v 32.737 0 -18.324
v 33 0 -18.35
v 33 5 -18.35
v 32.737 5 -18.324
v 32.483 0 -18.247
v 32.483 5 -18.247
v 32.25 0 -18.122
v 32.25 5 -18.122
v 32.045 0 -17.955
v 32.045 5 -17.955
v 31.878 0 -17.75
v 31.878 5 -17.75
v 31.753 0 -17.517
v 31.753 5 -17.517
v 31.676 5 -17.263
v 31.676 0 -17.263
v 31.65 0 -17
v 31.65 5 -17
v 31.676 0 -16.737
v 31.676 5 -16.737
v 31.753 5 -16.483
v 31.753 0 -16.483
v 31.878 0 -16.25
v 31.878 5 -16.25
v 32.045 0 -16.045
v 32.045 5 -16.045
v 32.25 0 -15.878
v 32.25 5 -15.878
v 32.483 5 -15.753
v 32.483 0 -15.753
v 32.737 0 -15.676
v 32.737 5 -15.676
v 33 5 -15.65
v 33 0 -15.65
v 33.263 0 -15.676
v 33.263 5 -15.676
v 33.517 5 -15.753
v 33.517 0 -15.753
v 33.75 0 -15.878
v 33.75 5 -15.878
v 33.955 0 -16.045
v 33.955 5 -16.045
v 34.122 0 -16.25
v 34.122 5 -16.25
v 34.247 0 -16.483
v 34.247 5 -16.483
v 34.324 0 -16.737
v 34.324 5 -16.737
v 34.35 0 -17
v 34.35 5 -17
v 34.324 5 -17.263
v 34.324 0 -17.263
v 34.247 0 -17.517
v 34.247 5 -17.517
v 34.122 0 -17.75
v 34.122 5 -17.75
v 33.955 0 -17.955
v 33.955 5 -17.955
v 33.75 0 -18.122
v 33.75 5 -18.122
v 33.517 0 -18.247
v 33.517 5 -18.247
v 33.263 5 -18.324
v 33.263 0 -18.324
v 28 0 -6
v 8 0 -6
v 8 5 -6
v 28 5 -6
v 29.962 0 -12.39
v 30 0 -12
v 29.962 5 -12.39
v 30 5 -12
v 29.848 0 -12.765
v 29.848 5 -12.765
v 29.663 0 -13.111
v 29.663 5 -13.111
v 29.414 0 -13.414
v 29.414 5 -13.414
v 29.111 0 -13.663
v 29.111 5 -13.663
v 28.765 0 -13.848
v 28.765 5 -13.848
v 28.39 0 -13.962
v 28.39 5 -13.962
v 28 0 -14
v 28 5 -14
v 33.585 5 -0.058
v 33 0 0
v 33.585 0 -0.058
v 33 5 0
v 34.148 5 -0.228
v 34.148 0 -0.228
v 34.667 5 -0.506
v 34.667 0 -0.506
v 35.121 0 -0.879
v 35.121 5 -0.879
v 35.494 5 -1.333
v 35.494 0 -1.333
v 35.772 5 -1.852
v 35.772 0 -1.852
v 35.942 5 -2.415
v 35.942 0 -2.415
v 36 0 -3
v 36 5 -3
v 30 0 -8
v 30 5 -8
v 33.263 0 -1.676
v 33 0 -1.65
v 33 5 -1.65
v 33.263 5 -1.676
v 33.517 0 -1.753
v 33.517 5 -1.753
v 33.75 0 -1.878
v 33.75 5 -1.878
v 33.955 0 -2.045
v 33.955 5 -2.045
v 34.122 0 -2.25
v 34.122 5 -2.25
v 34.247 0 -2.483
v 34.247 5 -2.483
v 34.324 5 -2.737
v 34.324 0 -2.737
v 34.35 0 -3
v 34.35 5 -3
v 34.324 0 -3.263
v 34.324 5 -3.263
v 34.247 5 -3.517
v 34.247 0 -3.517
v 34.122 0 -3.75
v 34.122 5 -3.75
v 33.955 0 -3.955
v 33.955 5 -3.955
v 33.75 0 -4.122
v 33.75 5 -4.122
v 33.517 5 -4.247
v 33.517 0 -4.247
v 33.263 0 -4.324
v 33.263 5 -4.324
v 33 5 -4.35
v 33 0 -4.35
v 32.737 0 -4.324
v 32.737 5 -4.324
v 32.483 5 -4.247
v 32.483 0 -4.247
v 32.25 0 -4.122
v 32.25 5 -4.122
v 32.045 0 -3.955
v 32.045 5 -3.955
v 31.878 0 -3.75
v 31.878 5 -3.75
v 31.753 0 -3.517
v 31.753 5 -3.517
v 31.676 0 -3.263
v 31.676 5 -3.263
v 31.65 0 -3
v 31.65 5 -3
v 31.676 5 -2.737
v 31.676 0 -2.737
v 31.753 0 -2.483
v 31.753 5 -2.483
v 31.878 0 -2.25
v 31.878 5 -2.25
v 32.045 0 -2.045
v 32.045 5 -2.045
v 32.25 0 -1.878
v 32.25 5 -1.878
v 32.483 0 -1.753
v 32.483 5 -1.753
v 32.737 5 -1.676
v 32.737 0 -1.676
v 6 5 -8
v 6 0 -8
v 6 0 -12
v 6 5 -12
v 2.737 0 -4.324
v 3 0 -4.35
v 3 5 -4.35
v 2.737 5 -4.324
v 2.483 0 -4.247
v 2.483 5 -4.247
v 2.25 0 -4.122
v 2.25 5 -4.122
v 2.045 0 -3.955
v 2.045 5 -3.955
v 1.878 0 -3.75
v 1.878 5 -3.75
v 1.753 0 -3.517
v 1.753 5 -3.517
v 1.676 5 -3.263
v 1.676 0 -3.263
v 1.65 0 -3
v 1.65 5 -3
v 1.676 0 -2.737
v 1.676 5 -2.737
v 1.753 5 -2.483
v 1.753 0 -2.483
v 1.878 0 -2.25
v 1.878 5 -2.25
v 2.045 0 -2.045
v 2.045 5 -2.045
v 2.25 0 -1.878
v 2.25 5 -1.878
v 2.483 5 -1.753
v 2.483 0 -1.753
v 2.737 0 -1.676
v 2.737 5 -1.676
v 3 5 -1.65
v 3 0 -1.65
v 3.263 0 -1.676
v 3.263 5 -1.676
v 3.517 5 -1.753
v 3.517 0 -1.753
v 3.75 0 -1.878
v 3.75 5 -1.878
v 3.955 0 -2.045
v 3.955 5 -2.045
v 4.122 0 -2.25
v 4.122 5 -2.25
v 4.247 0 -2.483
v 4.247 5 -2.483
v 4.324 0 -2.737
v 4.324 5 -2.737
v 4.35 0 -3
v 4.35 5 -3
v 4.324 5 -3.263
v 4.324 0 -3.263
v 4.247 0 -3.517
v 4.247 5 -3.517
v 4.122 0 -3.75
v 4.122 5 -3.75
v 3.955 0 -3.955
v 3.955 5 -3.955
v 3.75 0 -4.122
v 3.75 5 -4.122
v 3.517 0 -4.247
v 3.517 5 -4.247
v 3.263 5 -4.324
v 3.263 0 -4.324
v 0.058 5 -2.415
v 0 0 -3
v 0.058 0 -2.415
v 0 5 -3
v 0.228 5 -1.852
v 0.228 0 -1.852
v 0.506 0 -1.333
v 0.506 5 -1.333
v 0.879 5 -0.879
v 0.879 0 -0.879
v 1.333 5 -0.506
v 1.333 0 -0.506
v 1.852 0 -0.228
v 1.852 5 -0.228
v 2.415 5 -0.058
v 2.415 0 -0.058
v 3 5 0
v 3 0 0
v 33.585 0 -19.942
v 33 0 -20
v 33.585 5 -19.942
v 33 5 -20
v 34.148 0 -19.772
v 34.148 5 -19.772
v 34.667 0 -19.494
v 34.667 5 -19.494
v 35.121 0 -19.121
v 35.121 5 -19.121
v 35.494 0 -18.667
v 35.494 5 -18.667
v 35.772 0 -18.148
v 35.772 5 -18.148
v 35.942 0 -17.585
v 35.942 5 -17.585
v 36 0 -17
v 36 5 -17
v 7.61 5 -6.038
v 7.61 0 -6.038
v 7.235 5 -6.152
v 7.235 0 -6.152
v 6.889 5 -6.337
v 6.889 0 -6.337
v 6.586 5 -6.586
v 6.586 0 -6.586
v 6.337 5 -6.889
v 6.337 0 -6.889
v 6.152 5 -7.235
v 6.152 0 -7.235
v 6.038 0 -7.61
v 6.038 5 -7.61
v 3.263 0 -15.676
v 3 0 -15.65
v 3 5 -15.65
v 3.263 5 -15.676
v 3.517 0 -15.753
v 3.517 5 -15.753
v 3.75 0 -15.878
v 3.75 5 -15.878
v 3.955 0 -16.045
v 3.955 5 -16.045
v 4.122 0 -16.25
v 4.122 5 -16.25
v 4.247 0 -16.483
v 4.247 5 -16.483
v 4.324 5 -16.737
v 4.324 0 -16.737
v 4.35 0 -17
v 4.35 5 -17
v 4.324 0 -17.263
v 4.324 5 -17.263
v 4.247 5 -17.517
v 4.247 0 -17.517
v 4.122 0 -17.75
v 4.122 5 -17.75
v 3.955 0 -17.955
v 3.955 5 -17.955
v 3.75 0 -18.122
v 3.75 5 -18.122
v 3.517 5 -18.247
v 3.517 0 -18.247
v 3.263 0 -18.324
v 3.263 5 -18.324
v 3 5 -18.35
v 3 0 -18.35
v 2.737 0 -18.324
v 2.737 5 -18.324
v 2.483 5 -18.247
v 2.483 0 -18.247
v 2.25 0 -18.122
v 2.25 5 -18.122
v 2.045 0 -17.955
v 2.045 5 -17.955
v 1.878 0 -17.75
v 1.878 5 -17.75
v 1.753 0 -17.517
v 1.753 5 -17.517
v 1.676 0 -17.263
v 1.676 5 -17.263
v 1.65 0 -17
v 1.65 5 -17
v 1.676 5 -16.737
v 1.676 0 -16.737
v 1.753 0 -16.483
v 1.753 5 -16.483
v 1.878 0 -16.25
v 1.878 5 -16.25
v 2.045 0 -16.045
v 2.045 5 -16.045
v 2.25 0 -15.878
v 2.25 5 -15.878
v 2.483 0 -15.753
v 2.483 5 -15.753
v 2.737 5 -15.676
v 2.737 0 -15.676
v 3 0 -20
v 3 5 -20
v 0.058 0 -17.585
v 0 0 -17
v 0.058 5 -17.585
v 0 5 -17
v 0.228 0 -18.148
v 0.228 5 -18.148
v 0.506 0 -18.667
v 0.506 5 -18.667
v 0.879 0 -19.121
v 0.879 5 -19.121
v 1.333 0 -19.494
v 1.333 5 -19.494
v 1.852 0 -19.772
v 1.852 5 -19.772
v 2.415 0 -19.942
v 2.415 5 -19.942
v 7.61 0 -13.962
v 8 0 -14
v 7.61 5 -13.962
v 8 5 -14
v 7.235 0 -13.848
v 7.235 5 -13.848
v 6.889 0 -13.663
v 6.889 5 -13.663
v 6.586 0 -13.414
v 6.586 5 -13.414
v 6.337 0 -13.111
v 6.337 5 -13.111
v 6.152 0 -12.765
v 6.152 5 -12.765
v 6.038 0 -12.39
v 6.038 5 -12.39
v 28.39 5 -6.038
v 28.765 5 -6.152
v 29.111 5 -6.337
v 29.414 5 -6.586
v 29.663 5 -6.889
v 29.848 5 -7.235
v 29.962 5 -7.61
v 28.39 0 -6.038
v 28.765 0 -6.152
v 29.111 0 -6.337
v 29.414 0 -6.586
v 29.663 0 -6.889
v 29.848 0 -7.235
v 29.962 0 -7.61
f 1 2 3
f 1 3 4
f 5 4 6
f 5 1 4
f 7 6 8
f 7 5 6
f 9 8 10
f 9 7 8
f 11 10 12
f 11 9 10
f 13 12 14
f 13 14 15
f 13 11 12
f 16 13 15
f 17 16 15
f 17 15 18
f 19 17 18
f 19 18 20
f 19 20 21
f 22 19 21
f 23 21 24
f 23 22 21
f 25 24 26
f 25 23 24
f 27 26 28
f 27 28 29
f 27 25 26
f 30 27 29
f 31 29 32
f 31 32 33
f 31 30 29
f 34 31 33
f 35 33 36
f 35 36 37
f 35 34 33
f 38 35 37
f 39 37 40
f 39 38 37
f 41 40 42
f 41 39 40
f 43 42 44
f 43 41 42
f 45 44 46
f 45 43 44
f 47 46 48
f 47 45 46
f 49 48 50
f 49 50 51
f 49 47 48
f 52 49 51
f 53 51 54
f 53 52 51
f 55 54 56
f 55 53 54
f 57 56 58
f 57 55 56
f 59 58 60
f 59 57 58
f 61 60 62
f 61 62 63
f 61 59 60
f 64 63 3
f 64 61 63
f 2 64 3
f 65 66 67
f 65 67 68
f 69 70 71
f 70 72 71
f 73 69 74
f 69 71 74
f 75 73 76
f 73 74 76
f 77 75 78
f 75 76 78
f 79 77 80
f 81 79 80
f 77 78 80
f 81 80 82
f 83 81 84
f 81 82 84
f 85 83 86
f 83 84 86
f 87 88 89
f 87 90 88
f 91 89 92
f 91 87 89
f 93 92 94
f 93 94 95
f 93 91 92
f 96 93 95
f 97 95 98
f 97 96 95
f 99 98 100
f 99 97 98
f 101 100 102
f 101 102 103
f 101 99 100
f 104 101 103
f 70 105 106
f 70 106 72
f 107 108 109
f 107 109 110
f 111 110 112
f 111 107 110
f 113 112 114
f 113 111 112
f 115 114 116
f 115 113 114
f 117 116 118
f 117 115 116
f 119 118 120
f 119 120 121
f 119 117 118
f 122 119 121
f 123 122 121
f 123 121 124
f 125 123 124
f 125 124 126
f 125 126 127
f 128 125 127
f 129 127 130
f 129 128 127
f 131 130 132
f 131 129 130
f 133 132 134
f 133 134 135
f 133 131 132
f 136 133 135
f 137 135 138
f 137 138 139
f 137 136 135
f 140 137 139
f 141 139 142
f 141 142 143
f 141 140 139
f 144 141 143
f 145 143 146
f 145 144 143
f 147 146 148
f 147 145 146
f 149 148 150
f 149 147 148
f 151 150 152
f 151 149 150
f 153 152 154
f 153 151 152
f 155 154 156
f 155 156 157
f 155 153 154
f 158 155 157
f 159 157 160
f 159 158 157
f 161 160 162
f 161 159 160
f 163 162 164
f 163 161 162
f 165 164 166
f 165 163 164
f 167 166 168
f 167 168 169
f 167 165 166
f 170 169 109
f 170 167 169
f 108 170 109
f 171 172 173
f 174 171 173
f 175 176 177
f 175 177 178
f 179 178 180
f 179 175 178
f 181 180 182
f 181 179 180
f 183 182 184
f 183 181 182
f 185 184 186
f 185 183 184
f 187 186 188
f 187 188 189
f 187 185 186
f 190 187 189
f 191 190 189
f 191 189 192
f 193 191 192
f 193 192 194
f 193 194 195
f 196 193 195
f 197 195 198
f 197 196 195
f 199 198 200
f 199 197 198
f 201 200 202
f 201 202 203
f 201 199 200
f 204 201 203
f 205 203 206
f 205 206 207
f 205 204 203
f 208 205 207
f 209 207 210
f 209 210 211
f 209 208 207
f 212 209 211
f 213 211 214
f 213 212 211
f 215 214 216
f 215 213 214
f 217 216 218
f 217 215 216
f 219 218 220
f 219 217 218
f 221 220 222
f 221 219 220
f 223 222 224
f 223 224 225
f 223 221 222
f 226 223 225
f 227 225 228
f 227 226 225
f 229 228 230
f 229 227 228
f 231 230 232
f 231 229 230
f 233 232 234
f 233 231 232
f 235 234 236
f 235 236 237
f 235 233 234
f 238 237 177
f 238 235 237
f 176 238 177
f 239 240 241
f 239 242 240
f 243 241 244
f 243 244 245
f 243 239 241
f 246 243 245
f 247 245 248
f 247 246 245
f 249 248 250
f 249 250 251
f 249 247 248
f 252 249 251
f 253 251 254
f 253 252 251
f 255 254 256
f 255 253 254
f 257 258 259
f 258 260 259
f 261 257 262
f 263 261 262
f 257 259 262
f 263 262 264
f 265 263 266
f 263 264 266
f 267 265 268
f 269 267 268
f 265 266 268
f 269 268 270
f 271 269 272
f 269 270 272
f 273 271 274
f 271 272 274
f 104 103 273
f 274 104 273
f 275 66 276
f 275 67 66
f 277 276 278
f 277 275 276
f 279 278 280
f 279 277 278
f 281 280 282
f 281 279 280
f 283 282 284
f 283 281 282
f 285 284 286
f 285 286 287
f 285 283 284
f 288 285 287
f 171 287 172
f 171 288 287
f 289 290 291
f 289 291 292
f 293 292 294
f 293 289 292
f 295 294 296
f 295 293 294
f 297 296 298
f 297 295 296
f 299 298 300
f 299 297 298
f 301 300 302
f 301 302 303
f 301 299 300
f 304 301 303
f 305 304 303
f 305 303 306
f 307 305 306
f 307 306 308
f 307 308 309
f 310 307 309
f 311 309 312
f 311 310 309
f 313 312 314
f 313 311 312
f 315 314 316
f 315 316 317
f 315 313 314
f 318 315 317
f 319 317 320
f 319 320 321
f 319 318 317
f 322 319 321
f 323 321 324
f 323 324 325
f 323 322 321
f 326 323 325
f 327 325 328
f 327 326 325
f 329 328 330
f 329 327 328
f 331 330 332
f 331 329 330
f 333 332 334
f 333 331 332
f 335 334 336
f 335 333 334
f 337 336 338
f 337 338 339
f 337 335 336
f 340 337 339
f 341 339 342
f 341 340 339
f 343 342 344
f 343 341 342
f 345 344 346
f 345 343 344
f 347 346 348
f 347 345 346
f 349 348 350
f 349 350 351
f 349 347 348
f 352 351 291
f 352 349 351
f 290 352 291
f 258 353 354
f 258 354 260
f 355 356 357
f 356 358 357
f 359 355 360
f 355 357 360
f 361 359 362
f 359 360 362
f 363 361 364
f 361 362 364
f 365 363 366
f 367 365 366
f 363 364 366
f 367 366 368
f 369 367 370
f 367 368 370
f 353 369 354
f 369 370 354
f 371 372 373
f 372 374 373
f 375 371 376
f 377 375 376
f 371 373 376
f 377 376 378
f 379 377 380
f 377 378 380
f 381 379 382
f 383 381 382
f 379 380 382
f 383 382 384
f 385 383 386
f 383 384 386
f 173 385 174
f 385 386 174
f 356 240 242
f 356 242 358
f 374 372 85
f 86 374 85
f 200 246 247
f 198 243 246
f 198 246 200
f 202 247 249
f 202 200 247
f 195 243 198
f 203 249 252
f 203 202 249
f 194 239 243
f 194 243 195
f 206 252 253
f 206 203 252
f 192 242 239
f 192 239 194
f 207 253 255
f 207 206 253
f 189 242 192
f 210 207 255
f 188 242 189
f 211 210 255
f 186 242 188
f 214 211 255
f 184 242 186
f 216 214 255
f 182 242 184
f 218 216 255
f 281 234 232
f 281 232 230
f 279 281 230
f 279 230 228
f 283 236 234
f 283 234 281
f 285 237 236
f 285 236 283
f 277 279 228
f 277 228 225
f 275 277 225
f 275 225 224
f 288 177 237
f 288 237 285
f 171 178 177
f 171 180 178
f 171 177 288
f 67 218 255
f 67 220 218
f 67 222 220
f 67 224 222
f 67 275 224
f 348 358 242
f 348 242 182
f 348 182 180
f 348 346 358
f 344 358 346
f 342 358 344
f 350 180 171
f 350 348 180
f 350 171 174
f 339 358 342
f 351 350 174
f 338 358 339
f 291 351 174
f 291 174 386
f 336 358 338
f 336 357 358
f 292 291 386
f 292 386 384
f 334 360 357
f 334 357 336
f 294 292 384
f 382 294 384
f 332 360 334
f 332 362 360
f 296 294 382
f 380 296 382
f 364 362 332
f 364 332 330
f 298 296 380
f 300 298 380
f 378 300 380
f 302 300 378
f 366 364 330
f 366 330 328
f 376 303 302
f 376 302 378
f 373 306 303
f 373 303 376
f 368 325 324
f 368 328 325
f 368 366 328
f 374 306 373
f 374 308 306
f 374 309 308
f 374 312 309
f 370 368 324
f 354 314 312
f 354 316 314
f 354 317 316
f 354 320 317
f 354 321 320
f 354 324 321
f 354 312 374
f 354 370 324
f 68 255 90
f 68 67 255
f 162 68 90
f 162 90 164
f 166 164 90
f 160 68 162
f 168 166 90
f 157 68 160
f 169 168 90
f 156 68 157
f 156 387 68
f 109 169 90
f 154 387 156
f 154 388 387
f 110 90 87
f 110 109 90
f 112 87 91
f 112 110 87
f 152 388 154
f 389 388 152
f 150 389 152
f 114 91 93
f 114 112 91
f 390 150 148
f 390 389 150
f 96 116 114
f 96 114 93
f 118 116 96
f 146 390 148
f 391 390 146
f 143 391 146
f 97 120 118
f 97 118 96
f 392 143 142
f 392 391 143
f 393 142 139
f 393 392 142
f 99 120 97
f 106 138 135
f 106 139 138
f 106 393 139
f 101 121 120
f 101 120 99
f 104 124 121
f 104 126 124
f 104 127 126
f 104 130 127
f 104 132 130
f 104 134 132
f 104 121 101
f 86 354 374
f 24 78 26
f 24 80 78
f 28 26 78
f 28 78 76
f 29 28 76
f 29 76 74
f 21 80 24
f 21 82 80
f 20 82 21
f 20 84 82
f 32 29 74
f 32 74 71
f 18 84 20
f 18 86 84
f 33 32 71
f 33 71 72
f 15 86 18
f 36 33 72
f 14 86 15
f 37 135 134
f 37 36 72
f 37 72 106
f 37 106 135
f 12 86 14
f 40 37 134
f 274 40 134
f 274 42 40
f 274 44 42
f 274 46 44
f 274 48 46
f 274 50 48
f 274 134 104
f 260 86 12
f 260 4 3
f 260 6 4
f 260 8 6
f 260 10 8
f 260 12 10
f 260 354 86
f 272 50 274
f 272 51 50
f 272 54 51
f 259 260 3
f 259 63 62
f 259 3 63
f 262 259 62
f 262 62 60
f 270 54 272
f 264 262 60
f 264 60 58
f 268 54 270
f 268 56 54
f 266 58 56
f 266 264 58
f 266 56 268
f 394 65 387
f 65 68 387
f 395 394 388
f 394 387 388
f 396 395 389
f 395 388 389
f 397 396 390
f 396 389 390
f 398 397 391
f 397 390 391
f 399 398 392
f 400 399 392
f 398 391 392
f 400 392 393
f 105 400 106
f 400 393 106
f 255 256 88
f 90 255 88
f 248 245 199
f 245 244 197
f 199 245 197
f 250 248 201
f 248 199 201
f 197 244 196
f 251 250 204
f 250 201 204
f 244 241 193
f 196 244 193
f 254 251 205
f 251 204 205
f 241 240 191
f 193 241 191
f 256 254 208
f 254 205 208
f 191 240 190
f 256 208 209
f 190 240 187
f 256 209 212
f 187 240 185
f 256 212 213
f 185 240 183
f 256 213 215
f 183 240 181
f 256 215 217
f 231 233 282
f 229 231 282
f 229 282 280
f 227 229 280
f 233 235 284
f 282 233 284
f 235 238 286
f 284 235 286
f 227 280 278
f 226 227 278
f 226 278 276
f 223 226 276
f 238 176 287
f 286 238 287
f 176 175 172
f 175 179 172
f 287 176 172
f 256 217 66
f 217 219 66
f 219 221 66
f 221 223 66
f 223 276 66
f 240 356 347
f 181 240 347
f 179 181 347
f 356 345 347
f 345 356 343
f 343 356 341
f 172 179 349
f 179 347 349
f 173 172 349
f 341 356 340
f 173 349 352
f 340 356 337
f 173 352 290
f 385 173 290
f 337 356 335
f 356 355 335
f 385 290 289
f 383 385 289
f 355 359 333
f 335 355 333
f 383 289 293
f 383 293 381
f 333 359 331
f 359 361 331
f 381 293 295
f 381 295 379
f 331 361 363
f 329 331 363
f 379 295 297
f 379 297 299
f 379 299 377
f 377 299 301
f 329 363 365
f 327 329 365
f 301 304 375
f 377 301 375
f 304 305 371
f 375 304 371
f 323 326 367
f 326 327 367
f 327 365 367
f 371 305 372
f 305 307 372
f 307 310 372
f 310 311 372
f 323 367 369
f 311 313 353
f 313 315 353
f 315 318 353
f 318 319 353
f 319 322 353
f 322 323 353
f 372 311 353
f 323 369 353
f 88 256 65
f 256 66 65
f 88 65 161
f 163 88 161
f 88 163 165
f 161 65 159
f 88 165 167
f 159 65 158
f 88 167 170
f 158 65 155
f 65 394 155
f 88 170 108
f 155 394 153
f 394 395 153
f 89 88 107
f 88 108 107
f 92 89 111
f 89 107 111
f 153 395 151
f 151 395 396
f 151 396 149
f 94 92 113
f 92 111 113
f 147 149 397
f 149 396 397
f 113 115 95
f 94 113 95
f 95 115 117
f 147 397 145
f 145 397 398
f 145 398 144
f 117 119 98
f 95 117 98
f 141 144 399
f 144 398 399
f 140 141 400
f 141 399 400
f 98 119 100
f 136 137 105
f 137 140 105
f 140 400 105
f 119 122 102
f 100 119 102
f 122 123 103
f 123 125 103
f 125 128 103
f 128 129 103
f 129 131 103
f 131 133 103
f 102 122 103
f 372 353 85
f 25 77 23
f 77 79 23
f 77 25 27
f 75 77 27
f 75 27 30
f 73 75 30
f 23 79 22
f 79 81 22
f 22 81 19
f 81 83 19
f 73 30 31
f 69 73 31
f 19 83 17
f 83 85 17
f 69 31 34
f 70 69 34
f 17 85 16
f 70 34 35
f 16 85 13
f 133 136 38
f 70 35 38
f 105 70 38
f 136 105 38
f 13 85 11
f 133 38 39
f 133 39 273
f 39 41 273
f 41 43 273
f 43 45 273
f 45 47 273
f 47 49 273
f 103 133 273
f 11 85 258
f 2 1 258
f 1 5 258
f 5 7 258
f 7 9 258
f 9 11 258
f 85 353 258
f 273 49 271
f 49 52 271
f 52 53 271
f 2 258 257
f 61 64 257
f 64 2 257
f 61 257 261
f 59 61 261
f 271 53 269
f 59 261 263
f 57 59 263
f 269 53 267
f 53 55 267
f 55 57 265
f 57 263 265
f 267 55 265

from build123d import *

# Parameters (mm, degrees)
SKETCH_1_W      = 36
SKETCH_1_H      = 20
SKETCH_1_R      = 1.35
SKETCH_1_W_2    = 24
SKETCH_1_H_2    = 8
EXTRUDE_1_DEPTH = 5
FILLET_1_R      = 3
FILLET_2_R      = 2


with BuildPart() as part:
    # 草图1 → 凸台-拉伸1 (new body)
    with BuildSketch(Plane(origin=(0, 0, 0), x_dir=(1, 0, 0), z_dir=(0, 1, 0))):
        with Locations((18, 10)):
            Rectangle(SKETCH_1_W, SKETCH_1_H)
        with Locations(Location((3, 17, 0), (0, 0, 270))):
            Circle(SKETCH_1_R, mode=Mode.SUBTRACT)
        with Locations(Location((33, 17, 0), (0, 0, 90))):
            Circle(SKETCH_1_R, mode=Mode.SUBTRACT)
        with Locations(Location((33, 3, 0), (0, 0, 270))):
            Circle(SKETCH_1_R, mode=Mode.SUBTRACT)
        with Locations(Location((3, 3, 0), (0, 0, 90))):
            Circle(SKETCH_1_R, mode=Mode.SUBTRACT)
        with Locations((18, 10)):
            Rectangle(SKETCH_1_W_2, SKETCH_1_H_2, mode=Mode.SUBTRACT)
    extrude(amount=EXTRUDE_1_DEPTH)

    # 圆角1
    fillet_1_edges = [part.edges().sort_by_distance(p)[0] for p in [
        (0, 2.5, -20),
        (36, 2.5, -20),
        (36, 2.5, 0),
        (0, 2.5, 0),
    ]]
    fillet(fillet_1_edges, radius=FILLET_1_R)

    # 圆角2
    fillet_2_edges = [part.edges().sort_by_distance(p)[0] for p in [
        (6, 2.5, -6),
        (30, 2.5, -6),
        (30, 2.5, -14),
        (6, 2.5, -14),
    ]]
    fillet(fillet_2_edges, radius=FILLET_2_R)


solid = part.part
